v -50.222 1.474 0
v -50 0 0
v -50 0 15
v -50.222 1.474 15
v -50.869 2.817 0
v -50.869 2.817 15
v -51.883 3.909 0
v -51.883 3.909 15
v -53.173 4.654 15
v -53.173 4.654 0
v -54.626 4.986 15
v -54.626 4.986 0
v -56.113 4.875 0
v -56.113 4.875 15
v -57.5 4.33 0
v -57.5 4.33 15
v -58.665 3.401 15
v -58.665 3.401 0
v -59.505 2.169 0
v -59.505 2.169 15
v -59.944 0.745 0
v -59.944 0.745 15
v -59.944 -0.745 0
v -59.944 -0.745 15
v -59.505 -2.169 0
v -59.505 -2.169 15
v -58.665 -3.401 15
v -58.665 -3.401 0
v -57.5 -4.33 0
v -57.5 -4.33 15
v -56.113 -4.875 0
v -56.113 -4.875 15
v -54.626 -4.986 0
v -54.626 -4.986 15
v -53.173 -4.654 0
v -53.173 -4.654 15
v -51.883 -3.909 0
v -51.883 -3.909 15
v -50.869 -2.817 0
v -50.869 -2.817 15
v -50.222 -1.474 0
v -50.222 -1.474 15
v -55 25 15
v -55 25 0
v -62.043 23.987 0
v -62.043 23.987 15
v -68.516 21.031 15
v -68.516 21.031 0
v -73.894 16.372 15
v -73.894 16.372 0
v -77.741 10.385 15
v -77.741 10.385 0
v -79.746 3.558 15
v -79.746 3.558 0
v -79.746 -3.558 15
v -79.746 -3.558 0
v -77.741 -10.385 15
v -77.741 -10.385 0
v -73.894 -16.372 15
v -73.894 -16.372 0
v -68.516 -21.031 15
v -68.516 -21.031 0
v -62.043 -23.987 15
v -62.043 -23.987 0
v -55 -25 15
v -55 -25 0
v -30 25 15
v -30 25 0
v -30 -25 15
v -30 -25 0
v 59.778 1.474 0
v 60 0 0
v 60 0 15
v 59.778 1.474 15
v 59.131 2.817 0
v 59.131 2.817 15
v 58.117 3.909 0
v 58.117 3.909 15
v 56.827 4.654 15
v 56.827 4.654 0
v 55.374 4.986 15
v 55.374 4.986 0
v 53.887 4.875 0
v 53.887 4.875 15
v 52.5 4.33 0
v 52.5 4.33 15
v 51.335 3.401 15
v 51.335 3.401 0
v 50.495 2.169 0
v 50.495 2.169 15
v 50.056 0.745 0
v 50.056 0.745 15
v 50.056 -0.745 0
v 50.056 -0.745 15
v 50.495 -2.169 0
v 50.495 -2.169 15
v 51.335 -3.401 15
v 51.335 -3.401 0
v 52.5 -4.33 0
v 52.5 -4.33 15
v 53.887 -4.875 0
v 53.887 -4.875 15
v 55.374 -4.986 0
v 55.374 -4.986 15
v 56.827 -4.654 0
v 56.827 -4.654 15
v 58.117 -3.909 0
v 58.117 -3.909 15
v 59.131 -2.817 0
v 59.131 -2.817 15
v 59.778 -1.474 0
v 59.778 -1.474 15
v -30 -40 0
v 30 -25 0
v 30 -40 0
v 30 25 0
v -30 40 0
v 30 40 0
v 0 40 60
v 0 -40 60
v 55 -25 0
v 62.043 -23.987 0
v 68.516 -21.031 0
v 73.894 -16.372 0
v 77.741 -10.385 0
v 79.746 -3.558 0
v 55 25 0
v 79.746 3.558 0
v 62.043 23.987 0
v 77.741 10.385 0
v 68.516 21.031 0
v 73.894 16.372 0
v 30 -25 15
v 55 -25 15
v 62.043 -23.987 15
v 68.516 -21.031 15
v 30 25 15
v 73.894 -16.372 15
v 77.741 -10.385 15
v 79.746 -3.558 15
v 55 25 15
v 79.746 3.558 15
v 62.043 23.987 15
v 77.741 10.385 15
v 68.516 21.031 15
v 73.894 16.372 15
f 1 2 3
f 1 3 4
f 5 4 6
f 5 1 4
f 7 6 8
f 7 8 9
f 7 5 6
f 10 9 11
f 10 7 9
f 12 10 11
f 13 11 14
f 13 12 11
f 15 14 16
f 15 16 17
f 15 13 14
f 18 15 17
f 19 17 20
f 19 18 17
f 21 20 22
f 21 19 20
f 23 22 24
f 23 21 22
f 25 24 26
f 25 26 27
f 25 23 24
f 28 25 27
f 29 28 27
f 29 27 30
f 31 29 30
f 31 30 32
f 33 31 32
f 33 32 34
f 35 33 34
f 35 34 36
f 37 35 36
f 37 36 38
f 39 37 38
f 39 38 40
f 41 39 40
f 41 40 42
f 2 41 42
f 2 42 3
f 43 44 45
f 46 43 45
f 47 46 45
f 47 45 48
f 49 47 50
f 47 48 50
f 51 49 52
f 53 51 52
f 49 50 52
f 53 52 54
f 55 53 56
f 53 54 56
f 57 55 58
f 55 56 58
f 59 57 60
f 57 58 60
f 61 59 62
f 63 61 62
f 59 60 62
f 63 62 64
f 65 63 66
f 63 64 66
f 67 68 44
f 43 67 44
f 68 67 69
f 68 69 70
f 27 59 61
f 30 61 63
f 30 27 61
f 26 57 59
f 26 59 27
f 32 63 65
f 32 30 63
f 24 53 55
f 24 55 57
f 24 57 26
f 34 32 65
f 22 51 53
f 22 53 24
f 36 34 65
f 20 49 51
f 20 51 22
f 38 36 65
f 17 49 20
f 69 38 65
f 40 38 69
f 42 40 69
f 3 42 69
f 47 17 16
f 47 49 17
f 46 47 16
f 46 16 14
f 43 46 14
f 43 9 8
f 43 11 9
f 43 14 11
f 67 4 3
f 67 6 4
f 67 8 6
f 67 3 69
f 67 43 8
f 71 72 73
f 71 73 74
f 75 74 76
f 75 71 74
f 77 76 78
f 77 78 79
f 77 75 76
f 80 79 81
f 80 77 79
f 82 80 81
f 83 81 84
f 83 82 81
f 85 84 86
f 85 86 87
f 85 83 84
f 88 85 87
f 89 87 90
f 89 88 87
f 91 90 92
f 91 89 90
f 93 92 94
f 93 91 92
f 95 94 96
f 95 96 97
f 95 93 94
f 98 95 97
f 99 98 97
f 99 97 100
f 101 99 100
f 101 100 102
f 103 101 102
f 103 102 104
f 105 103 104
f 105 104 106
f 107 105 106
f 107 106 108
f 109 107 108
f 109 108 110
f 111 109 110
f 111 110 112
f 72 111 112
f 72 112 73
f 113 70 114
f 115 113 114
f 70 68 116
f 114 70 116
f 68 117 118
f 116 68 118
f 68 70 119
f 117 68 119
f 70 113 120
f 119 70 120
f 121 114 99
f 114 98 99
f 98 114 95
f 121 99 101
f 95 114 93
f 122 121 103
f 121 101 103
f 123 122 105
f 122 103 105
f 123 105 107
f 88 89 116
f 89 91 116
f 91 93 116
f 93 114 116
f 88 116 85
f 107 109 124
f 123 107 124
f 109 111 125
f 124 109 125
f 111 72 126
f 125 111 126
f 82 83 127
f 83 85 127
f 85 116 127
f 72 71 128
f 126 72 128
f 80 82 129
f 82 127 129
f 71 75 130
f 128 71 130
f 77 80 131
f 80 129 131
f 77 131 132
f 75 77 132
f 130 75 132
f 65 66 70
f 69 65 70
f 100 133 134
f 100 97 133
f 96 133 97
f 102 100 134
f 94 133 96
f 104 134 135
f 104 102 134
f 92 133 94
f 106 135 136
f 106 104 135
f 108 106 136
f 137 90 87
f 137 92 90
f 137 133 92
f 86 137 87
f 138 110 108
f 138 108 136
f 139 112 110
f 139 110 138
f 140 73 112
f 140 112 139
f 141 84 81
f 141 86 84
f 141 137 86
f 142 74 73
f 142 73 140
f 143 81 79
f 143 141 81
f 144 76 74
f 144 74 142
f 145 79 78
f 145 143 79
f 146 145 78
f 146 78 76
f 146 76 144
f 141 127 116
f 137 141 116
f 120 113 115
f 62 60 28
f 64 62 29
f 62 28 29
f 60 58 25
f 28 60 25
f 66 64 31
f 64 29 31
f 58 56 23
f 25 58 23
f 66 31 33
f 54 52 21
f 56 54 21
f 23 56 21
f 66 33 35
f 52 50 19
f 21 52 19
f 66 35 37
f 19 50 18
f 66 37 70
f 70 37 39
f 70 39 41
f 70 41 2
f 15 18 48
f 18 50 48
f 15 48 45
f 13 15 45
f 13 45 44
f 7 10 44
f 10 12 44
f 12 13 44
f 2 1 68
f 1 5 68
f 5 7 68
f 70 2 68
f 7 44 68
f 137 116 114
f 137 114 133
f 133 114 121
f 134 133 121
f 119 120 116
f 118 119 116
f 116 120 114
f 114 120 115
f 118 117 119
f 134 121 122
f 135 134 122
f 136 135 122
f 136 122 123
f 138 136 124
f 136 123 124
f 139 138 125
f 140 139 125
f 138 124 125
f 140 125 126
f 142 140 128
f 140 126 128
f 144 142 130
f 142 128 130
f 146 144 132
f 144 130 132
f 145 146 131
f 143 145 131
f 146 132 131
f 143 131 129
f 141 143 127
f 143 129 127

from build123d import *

# Parameters (mm, degrees)
F0_R      = 5
F1_DEPTH  = 60
F1_FACE_R = 5
F2_DEPTH  = 45
F3_W      = 60
F3_H      = 80
F4_DEPTH  = 45
F6_DEPTH  = 80


with BuildPart() as f1:
    # F0 (on Top) → F1 (new body)
    with BuildSketch(Plane.XY):
        with BuildLine():
            Line((-30, -25), (-30, 0))
            Line((-30, 0), (-30, 25))
            Line((-30, 25), (-55, 25))
            ThreePointArc((-55, 25), (-80, 0), (-55, -25))
            Line((-55, -25), (-30, -25))
        make_face()
        with Locations((-55, 0)):
            Circle(F0_R, mode=Mode.SUBTRACT)
        Polygon((-30, 25), (-30, 0), (-30, -25), (-30, -40), (0, -40), (30, -40), (30, -25), (30, 25), (30, 40), (0, 40), (-30, 40), align=None)
        with BuildLine():
            Line((55, 25), (30, 25))
            Line((30, 25), (30, -25))
            Line((30, -25), (55, -25))
            ThreePointArc((55, -25), (80, 0), (55, 25))
        make_face()
        with Locations((55, 0)):
            Circle(F0_R, mode=Mode.SUBTRACT)
    extrude(amount=F1_DEPTH)

    # F1_face (on face) → F2 (cut)
    with BuildSketch(Plane.XY.offset(60)):
        with BuildLine():
            Line((-30, -25), (-30, -40))
            Line((-30, -40), (30, -40))
            Line((30, -40), (30, -25))
            Line((30, -25), (55, -25))
            ThreePointArc((55, -25), (80, 0), (55, 25))
            Line((55, 25), (30, 25))
            Line((30, 25), (30, 40))
            Line((30, 40), (-30, 40))
            Line((-30, 40), (-30, 25))
            Line((-30, 25), (-55, 25))
            ThreePointArc((-55, 25), (-80, 0), (-55, -25))
            Line((-55, -25), (-30, -25))
        make_face()
        with Locations((-55, 0)):
            Circle(F1_FACE_R, mode=Mode.SUBTRACT)
        with Locations((55, 0)):
            Circle(F1_FACE_R, mode=Mode.SUBTRACT)
    extrude(amount=-F2_DEPTH, mode=Mode.SUBTRACT)

    # F3 (on face) → F4 (join)
    with BuildSketch(Plane.XY.offset(15)):
        Rectangle(F3_W, F3_H)
    extrude(amount=F4_DEPTH)

    # F5 (on face) → F6 (cut)
    with BuildSketch(Plane.XZ.offset(40)):
        Polygon((-30, 60), (-30, 0), (0, 60), align=None)
        Polygon((30, 60), (0, 60), (30, 0), align=None)
    extrude(amount=-F6_DEPTH, mode=Mode.SUBTRACT)


solid = f1.part
